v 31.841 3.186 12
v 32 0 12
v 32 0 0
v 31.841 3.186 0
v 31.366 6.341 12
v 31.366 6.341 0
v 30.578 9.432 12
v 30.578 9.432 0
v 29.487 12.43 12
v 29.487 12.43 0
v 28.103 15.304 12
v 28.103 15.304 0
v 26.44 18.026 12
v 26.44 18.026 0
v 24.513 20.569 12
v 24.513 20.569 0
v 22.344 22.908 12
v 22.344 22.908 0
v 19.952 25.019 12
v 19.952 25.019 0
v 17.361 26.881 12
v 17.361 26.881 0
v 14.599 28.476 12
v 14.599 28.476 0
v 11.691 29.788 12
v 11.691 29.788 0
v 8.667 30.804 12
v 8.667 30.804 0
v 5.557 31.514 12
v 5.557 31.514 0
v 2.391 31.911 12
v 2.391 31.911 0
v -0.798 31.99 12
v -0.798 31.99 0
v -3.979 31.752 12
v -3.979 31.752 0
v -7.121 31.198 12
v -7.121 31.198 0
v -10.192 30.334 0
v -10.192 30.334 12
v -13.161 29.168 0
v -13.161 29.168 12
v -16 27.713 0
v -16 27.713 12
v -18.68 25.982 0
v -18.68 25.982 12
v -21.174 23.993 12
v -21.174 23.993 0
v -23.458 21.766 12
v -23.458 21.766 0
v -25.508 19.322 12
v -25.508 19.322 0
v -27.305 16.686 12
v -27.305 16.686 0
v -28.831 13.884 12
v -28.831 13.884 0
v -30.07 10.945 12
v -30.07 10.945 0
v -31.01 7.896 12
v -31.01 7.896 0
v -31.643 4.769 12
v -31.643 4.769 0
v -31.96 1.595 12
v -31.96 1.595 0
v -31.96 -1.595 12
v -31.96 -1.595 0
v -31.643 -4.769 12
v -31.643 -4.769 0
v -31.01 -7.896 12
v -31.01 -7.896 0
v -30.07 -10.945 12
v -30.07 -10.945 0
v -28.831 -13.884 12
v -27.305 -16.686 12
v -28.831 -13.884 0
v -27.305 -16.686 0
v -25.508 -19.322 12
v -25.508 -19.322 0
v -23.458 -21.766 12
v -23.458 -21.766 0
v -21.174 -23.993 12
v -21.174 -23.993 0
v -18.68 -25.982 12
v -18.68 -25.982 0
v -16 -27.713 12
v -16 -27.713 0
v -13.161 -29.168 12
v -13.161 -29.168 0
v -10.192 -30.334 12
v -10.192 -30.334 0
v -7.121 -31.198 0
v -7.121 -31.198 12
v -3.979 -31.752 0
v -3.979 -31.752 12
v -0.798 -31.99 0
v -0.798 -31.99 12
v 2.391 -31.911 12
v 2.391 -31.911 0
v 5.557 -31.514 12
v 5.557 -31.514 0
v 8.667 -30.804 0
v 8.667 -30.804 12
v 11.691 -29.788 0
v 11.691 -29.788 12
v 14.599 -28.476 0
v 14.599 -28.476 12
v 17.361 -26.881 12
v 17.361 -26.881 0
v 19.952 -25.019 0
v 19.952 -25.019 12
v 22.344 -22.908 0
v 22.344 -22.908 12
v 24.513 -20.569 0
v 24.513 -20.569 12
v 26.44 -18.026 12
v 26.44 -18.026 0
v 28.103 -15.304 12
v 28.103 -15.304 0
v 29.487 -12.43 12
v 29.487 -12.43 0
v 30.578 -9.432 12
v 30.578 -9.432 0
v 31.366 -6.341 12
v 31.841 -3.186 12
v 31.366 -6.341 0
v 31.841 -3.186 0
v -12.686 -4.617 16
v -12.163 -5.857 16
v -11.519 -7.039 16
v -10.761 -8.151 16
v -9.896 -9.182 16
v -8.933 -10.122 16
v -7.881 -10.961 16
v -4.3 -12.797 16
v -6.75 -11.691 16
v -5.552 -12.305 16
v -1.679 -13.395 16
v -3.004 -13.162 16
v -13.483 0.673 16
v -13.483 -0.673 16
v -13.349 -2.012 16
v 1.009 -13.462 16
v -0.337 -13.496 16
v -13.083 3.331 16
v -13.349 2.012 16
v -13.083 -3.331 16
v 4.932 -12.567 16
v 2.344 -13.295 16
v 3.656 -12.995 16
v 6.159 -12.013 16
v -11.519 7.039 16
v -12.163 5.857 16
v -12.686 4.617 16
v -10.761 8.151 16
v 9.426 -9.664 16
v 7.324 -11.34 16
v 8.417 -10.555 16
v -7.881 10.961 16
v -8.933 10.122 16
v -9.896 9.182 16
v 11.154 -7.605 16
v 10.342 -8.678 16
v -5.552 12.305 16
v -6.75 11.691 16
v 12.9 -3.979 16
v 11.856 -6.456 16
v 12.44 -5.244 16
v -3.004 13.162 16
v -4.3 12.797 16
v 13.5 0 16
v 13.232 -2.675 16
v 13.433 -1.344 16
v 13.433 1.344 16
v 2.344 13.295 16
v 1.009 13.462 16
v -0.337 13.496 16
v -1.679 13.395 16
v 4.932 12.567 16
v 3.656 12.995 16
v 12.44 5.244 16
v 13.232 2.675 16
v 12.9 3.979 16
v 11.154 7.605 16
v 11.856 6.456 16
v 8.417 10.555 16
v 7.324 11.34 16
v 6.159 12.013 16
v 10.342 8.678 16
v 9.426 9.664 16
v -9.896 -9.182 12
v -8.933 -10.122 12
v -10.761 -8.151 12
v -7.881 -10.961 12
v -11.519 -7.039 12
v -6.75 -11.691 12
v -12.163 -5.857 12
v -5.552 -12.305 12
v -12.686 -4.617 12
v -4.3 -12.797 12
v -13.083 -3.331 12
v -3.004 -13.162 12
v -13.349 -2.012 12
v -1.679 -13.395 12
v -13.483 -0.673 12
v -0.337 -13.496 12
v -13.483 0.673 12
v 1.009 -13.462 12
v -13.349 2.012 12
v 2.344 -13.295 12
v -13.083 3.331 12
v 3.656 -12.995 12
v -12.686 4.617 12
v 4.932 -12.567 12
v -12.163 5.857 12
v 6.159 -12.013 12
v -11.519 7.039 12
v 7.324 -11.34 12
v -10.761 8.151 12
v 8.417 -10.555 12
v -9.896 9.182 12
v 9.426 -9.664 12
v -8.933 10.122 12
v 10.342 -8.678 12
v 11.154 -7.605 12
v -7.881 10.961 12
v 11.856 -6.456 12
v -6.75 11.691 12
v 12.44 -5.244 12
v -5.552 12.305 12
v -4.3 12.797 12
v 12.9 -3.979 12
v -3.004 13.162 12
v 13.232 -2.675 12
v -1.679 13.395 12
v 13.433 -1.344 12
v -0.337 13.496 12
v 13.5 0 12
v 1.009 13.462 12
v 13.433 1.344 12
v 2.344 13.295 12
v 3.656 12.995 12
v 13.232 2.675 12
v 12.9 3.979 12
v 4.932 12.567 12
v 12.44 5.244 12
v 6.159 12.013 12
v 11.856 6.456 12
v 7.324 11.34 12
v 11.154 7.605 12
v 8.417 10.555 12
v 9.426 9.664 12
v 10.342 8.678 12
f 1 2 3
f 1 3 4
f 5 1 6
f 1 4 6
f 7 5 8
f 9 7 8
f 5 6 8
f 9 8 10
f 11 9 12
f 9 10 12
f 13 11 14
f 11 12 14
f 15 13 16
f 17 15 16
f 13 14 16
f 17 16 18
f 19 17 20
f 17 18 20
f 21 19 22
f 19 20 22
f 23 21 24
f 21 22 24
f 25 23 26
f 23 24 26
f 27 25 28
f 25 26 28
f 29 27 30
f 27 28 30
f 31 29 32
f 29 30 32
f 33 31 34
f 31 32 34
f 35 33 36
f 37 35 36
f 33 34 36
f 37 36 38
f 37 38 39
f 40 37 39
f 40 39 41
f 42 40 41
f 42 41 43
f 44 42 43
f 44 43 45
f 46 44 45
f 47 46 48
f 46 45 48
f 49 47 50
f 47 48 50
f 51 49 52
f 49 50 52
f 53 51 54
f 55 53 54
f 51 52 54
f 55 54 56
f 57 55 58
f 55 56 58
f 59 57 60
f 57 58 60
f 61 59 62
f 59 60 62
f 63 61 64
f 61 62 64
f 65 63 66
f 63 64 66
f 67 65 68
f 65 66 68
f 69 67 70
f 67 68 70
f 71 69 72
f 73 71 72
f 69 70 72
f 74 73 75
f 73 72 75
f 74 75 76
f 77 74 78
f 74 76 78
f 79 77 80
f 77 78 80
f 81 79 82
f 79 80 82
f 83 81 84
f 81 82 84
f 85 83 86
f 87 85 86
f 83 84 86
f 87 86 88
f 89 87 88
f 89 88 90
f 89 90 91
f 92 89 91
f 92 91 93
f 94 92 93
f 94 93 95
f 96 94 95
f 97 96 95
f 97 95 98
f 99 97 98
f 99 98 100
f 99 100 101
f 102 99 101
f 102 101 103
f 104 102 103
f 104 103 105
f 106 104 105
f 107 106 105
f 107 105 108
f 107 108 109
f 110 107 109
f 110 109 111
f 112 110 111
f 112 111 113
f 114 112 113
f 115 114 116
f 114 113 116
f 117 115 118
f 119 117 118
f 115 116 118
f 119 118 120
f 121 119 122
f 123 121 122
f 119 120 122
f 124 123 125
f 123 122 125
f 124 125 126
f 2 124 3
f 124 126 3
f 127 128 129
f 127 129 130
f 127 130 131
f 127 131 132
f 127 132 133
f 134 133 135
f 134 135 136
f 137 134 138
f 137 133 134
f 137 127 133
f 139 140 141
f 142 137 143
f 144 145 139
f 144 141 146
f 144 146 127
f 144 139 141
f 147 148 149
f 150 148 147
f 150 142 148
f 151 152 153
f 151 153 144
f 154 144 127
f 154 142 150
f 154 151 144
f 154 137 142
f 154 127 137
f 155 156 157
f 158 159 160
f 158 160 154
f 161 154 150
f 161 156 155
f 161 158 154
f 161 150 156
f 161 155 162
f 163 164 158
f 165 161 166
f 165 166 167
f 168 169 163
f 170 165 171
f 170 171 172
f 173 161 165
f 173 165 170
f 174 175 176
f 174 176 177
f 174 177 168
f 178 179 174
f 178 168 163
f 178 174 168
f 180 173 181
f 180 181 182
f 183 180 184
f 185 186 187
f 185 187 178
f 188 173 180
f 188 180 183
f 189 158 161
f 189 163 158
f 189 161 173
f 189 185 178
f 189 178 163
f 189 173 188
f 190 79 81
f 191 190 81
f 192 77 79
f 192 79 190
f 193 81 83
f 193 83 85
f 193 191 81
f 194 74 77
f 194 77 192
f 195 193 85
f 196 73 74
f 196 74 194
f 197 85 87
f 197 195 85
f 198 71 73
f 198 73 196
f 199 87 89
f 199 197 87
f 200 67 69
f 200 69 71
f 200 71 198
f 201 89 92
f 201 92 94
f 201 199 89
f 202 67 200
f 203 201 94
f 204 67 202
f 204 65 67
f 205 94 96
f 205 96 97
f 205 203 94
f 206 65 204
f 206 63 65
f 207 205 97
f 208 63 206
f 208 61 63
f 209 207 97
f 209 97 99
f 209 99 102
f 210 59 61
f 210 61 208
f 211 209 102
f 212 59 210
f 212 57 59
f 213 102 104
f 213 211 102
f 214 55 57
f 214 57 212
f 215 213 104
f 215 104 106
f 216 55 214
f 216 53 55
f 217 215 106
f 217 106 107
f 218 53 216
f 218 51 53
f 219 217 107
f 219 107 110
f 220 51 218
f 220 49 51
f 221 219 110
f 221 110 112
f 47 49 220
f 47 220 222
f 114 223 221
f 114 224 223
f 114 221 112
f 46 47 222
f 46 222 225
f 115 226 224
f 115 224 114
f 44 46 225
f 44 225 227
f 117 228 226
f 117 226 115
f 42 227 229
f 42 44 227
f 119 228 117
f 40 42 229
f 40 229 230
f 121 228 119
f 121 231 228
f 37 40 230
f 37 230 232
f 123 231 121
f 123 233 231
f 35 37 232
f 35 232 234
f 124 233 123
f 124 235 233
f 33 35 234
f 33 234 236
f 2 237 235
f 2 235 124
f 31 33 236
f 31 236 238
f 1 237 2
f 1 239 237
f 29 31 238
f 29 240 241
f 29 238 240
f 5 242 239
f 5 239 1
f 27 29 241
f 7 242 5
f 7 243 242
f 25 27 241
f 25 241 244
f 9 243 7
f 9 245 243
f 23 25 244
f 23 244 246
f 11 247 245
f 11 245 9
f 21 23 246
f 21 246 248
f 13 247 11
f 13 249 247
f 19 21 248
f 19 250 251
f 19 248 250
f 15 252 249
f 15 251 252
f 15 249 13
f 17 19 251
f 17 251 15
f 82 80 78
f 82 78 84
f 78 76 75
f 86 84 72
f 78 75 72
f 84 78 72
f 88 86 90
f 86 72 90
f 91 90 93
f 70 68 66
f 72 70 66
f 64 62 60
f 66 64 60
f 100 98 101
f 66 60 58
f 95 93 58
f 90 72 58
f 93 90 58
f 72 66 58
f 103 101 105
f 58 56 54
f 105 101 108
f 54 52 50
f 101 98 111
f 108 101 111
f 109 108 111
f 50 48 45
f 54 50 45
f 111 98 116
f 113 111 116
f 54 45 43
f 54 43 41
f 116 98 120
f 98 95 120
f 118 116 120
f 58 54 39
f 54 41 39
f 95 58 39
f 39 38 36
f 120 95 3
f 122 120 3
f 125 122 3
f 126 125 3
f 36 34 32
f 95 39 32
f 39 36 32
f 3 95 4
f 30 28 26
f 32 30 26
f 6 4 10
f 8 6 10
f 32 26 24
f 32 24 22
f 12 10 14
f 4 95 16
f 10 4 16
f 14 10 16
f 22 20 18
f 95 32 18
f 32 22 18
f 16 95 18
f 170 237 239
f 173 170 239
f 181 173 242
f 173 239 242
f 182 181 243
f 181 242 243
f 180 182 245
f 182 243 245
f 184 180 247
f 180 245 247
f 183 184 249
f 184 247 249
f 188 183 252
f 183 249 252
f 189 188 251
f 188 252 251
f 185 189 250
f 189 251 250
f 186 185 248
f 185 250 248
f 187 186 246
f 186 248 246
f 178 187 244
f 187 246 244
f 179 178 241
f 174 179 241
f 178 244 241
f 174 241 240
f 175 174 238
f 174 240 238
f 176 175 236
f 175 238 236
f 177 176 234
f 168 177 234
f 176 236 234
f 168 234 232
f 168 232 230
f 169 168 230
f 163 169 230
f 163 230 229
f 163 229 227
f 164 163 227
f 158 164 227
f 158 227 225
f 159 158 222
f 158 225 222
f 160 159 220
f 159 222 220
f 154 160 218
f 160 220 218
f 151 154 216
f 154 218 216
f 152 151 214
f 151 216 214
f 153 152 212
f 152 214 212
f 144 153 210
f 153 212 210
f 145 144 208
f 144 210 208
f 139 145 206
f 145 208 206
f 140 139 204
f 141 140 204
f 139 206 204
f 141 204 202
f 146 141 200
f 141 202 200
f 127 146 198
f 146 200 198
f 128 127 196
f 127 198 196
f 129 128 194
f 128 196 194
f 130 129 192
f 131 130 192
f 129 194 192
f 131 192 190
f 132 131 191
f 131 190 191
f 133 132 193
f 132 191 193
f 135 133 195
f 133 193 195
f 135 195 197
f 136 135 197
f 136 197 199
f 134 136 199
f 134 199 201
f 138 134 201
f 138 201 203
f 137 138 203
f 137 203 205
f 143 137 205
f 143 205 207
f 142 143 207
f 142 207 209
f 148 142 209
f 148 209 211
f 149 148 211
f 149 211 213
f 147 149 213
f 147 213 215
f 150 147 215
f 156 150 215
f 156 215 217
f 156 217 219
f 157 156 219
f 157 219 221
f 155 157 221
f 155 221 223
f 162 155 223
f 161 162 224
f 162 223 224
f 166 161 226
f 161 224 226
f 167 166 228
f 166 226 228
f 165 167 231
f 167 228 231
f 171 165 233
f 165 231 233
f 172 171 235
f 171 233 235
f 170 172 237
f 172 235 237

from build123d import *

# Parameters (mm, degrees)
SKETCH_01_WHEEL_PROFILE_R           = 32
PAD_02_WHEEL_DEPTH                  = 12
SKETCH_03_FRONTHUB_PROFILE_R        = 13.5
PAD_04_FRONTHUB_DEPTH               = 4
SKETCH_05_CENTER_SCREW_HOLE_R       = 1.2
POCKET_06_CENTER_SCREW_HOLE_DEPTH   = 18
SKETCH_07_SERVOHORN_POCKET_R        = 10.4
POCKET_08_SERVOHORN_POCKET_DEPTH    = 2.6
SKETCH_09_HORN_SCREW_HOLES_4X_R     = 1.1
POCKET_10_HORN_SCREW_HOLES_4X_DEPTH = 18
SKETCH_11_SPOKE_CUTOUTS_6X_R        = 4
POCKET_12_SPOKE_CUTOUTS_6X_DEPTH    = 18


with BuildPart() as part:
    # Sketch_01_Wheel_Profile → Pad_02_Wheel (new body)
    with BuildSketch(Plane.XY):
        Circle(SKETCH_01_WHEEL_PROFILE_R)
    extrude(amount=PAD_02_WHEEL_DEPTH)

    # Sketch_03_FrontHub_Profile → Pad_04_FrontHub (join)
    with BuildSketch(Plane.XY.offset(12)):
        Circle(SKETCH_03_FRONTHUB_PROFILE_R)
    extrude(amount=PAD_04_FRONTHUB_DEPTH)

    # Sketch_05_Center_Screw_Hole → Pocket_06_Center_Screw_Hole (cut)
    with BuildSketch(Plane.XY.offset(16)):
        Circle(SKETCH_05_CENTER_SCREW_HOLE_R)
    extrude(amount=POCKET_06_CENTER_SCREW_HOLE_DEPTH, mode=Mode.SUBTRACT)

    # Sketch_07_ServoHorn_Pocket → Pocket_08_ServoHorn_Pocket (cut)
    with BuildSketch(Plane.XY.offset(16)):
        Circle(SKETCH_07_SERVOHORN_POCKET_R)
    extrude(amount=POCKET_08_SERVOHORN_POCKET_DEPTH, mode=Mode.SUBTRACT)

    # Sketch_09_Horn_Screw_Holes_4x → Pocket_10_Horn_Screw_Holes_4x (cut)
    with BuildSketch(Plane.XY.offset(16)):
        with Locations((7.5, 0)):
            Circle(SKETCH_09_HORN_SCREW_HOLES_4X_R)
        with Locations((0, 7.5)):
            Circle(SKETCH_09_HORN_SCREW_HOLES_4X_R)
        with Locations((-7.5, 0)):
            Circle(SKETCH_09_HORN_SCREW_HOLES_4X_R)
        with Locations((0, -7.5)):
            Circle(SKETCH_09_HORN_SCREW_HOLES_4X_R)
    extrude(amount=POCKET_10_HORN_SCREW_HOLES_4X_DEPTH, mode=Mode.SUBTRACT)

    # Sketch_11_Spoke_Cutouts_6x → Pocket_12_Spoke_Cutouts_6x (cut)
    with BuildSketch(Plane.XY.offset(16)):
        with Locations((19.5, 0)):
            Circle(SKETCH_11_SPOKE_CUTOUTS_6X_R)
        with Locations((9.75, 16.887495)):
            Circle(SKETCH_11_SPOKE_CUTOUTS_6X_R)
        with Locations((-9.75, 16.887495)):
            Circle(SKETCH_11_SPOKE_CUTOUTS_6X_R)
        with Locations((-19.5, 0)):
            Circle(SKETCH_11_SPOKE_CUTOUTS_6X_R)
        with Locations((-9.75, -16.887495)):
            Circle(SKETCH_11_SPOKE_CUTOUTS_6X_R)
        with Locations((9.75, -16.887495)):
            Circle(SKETCH_11_SPOKE_CUTOUTS_6X_R)
    extrude(amount=POCKET_12_SPOKE_CUTOUTS_6X_DEPTH, mode=Mode.SUBTRACT)


solid = part.part
